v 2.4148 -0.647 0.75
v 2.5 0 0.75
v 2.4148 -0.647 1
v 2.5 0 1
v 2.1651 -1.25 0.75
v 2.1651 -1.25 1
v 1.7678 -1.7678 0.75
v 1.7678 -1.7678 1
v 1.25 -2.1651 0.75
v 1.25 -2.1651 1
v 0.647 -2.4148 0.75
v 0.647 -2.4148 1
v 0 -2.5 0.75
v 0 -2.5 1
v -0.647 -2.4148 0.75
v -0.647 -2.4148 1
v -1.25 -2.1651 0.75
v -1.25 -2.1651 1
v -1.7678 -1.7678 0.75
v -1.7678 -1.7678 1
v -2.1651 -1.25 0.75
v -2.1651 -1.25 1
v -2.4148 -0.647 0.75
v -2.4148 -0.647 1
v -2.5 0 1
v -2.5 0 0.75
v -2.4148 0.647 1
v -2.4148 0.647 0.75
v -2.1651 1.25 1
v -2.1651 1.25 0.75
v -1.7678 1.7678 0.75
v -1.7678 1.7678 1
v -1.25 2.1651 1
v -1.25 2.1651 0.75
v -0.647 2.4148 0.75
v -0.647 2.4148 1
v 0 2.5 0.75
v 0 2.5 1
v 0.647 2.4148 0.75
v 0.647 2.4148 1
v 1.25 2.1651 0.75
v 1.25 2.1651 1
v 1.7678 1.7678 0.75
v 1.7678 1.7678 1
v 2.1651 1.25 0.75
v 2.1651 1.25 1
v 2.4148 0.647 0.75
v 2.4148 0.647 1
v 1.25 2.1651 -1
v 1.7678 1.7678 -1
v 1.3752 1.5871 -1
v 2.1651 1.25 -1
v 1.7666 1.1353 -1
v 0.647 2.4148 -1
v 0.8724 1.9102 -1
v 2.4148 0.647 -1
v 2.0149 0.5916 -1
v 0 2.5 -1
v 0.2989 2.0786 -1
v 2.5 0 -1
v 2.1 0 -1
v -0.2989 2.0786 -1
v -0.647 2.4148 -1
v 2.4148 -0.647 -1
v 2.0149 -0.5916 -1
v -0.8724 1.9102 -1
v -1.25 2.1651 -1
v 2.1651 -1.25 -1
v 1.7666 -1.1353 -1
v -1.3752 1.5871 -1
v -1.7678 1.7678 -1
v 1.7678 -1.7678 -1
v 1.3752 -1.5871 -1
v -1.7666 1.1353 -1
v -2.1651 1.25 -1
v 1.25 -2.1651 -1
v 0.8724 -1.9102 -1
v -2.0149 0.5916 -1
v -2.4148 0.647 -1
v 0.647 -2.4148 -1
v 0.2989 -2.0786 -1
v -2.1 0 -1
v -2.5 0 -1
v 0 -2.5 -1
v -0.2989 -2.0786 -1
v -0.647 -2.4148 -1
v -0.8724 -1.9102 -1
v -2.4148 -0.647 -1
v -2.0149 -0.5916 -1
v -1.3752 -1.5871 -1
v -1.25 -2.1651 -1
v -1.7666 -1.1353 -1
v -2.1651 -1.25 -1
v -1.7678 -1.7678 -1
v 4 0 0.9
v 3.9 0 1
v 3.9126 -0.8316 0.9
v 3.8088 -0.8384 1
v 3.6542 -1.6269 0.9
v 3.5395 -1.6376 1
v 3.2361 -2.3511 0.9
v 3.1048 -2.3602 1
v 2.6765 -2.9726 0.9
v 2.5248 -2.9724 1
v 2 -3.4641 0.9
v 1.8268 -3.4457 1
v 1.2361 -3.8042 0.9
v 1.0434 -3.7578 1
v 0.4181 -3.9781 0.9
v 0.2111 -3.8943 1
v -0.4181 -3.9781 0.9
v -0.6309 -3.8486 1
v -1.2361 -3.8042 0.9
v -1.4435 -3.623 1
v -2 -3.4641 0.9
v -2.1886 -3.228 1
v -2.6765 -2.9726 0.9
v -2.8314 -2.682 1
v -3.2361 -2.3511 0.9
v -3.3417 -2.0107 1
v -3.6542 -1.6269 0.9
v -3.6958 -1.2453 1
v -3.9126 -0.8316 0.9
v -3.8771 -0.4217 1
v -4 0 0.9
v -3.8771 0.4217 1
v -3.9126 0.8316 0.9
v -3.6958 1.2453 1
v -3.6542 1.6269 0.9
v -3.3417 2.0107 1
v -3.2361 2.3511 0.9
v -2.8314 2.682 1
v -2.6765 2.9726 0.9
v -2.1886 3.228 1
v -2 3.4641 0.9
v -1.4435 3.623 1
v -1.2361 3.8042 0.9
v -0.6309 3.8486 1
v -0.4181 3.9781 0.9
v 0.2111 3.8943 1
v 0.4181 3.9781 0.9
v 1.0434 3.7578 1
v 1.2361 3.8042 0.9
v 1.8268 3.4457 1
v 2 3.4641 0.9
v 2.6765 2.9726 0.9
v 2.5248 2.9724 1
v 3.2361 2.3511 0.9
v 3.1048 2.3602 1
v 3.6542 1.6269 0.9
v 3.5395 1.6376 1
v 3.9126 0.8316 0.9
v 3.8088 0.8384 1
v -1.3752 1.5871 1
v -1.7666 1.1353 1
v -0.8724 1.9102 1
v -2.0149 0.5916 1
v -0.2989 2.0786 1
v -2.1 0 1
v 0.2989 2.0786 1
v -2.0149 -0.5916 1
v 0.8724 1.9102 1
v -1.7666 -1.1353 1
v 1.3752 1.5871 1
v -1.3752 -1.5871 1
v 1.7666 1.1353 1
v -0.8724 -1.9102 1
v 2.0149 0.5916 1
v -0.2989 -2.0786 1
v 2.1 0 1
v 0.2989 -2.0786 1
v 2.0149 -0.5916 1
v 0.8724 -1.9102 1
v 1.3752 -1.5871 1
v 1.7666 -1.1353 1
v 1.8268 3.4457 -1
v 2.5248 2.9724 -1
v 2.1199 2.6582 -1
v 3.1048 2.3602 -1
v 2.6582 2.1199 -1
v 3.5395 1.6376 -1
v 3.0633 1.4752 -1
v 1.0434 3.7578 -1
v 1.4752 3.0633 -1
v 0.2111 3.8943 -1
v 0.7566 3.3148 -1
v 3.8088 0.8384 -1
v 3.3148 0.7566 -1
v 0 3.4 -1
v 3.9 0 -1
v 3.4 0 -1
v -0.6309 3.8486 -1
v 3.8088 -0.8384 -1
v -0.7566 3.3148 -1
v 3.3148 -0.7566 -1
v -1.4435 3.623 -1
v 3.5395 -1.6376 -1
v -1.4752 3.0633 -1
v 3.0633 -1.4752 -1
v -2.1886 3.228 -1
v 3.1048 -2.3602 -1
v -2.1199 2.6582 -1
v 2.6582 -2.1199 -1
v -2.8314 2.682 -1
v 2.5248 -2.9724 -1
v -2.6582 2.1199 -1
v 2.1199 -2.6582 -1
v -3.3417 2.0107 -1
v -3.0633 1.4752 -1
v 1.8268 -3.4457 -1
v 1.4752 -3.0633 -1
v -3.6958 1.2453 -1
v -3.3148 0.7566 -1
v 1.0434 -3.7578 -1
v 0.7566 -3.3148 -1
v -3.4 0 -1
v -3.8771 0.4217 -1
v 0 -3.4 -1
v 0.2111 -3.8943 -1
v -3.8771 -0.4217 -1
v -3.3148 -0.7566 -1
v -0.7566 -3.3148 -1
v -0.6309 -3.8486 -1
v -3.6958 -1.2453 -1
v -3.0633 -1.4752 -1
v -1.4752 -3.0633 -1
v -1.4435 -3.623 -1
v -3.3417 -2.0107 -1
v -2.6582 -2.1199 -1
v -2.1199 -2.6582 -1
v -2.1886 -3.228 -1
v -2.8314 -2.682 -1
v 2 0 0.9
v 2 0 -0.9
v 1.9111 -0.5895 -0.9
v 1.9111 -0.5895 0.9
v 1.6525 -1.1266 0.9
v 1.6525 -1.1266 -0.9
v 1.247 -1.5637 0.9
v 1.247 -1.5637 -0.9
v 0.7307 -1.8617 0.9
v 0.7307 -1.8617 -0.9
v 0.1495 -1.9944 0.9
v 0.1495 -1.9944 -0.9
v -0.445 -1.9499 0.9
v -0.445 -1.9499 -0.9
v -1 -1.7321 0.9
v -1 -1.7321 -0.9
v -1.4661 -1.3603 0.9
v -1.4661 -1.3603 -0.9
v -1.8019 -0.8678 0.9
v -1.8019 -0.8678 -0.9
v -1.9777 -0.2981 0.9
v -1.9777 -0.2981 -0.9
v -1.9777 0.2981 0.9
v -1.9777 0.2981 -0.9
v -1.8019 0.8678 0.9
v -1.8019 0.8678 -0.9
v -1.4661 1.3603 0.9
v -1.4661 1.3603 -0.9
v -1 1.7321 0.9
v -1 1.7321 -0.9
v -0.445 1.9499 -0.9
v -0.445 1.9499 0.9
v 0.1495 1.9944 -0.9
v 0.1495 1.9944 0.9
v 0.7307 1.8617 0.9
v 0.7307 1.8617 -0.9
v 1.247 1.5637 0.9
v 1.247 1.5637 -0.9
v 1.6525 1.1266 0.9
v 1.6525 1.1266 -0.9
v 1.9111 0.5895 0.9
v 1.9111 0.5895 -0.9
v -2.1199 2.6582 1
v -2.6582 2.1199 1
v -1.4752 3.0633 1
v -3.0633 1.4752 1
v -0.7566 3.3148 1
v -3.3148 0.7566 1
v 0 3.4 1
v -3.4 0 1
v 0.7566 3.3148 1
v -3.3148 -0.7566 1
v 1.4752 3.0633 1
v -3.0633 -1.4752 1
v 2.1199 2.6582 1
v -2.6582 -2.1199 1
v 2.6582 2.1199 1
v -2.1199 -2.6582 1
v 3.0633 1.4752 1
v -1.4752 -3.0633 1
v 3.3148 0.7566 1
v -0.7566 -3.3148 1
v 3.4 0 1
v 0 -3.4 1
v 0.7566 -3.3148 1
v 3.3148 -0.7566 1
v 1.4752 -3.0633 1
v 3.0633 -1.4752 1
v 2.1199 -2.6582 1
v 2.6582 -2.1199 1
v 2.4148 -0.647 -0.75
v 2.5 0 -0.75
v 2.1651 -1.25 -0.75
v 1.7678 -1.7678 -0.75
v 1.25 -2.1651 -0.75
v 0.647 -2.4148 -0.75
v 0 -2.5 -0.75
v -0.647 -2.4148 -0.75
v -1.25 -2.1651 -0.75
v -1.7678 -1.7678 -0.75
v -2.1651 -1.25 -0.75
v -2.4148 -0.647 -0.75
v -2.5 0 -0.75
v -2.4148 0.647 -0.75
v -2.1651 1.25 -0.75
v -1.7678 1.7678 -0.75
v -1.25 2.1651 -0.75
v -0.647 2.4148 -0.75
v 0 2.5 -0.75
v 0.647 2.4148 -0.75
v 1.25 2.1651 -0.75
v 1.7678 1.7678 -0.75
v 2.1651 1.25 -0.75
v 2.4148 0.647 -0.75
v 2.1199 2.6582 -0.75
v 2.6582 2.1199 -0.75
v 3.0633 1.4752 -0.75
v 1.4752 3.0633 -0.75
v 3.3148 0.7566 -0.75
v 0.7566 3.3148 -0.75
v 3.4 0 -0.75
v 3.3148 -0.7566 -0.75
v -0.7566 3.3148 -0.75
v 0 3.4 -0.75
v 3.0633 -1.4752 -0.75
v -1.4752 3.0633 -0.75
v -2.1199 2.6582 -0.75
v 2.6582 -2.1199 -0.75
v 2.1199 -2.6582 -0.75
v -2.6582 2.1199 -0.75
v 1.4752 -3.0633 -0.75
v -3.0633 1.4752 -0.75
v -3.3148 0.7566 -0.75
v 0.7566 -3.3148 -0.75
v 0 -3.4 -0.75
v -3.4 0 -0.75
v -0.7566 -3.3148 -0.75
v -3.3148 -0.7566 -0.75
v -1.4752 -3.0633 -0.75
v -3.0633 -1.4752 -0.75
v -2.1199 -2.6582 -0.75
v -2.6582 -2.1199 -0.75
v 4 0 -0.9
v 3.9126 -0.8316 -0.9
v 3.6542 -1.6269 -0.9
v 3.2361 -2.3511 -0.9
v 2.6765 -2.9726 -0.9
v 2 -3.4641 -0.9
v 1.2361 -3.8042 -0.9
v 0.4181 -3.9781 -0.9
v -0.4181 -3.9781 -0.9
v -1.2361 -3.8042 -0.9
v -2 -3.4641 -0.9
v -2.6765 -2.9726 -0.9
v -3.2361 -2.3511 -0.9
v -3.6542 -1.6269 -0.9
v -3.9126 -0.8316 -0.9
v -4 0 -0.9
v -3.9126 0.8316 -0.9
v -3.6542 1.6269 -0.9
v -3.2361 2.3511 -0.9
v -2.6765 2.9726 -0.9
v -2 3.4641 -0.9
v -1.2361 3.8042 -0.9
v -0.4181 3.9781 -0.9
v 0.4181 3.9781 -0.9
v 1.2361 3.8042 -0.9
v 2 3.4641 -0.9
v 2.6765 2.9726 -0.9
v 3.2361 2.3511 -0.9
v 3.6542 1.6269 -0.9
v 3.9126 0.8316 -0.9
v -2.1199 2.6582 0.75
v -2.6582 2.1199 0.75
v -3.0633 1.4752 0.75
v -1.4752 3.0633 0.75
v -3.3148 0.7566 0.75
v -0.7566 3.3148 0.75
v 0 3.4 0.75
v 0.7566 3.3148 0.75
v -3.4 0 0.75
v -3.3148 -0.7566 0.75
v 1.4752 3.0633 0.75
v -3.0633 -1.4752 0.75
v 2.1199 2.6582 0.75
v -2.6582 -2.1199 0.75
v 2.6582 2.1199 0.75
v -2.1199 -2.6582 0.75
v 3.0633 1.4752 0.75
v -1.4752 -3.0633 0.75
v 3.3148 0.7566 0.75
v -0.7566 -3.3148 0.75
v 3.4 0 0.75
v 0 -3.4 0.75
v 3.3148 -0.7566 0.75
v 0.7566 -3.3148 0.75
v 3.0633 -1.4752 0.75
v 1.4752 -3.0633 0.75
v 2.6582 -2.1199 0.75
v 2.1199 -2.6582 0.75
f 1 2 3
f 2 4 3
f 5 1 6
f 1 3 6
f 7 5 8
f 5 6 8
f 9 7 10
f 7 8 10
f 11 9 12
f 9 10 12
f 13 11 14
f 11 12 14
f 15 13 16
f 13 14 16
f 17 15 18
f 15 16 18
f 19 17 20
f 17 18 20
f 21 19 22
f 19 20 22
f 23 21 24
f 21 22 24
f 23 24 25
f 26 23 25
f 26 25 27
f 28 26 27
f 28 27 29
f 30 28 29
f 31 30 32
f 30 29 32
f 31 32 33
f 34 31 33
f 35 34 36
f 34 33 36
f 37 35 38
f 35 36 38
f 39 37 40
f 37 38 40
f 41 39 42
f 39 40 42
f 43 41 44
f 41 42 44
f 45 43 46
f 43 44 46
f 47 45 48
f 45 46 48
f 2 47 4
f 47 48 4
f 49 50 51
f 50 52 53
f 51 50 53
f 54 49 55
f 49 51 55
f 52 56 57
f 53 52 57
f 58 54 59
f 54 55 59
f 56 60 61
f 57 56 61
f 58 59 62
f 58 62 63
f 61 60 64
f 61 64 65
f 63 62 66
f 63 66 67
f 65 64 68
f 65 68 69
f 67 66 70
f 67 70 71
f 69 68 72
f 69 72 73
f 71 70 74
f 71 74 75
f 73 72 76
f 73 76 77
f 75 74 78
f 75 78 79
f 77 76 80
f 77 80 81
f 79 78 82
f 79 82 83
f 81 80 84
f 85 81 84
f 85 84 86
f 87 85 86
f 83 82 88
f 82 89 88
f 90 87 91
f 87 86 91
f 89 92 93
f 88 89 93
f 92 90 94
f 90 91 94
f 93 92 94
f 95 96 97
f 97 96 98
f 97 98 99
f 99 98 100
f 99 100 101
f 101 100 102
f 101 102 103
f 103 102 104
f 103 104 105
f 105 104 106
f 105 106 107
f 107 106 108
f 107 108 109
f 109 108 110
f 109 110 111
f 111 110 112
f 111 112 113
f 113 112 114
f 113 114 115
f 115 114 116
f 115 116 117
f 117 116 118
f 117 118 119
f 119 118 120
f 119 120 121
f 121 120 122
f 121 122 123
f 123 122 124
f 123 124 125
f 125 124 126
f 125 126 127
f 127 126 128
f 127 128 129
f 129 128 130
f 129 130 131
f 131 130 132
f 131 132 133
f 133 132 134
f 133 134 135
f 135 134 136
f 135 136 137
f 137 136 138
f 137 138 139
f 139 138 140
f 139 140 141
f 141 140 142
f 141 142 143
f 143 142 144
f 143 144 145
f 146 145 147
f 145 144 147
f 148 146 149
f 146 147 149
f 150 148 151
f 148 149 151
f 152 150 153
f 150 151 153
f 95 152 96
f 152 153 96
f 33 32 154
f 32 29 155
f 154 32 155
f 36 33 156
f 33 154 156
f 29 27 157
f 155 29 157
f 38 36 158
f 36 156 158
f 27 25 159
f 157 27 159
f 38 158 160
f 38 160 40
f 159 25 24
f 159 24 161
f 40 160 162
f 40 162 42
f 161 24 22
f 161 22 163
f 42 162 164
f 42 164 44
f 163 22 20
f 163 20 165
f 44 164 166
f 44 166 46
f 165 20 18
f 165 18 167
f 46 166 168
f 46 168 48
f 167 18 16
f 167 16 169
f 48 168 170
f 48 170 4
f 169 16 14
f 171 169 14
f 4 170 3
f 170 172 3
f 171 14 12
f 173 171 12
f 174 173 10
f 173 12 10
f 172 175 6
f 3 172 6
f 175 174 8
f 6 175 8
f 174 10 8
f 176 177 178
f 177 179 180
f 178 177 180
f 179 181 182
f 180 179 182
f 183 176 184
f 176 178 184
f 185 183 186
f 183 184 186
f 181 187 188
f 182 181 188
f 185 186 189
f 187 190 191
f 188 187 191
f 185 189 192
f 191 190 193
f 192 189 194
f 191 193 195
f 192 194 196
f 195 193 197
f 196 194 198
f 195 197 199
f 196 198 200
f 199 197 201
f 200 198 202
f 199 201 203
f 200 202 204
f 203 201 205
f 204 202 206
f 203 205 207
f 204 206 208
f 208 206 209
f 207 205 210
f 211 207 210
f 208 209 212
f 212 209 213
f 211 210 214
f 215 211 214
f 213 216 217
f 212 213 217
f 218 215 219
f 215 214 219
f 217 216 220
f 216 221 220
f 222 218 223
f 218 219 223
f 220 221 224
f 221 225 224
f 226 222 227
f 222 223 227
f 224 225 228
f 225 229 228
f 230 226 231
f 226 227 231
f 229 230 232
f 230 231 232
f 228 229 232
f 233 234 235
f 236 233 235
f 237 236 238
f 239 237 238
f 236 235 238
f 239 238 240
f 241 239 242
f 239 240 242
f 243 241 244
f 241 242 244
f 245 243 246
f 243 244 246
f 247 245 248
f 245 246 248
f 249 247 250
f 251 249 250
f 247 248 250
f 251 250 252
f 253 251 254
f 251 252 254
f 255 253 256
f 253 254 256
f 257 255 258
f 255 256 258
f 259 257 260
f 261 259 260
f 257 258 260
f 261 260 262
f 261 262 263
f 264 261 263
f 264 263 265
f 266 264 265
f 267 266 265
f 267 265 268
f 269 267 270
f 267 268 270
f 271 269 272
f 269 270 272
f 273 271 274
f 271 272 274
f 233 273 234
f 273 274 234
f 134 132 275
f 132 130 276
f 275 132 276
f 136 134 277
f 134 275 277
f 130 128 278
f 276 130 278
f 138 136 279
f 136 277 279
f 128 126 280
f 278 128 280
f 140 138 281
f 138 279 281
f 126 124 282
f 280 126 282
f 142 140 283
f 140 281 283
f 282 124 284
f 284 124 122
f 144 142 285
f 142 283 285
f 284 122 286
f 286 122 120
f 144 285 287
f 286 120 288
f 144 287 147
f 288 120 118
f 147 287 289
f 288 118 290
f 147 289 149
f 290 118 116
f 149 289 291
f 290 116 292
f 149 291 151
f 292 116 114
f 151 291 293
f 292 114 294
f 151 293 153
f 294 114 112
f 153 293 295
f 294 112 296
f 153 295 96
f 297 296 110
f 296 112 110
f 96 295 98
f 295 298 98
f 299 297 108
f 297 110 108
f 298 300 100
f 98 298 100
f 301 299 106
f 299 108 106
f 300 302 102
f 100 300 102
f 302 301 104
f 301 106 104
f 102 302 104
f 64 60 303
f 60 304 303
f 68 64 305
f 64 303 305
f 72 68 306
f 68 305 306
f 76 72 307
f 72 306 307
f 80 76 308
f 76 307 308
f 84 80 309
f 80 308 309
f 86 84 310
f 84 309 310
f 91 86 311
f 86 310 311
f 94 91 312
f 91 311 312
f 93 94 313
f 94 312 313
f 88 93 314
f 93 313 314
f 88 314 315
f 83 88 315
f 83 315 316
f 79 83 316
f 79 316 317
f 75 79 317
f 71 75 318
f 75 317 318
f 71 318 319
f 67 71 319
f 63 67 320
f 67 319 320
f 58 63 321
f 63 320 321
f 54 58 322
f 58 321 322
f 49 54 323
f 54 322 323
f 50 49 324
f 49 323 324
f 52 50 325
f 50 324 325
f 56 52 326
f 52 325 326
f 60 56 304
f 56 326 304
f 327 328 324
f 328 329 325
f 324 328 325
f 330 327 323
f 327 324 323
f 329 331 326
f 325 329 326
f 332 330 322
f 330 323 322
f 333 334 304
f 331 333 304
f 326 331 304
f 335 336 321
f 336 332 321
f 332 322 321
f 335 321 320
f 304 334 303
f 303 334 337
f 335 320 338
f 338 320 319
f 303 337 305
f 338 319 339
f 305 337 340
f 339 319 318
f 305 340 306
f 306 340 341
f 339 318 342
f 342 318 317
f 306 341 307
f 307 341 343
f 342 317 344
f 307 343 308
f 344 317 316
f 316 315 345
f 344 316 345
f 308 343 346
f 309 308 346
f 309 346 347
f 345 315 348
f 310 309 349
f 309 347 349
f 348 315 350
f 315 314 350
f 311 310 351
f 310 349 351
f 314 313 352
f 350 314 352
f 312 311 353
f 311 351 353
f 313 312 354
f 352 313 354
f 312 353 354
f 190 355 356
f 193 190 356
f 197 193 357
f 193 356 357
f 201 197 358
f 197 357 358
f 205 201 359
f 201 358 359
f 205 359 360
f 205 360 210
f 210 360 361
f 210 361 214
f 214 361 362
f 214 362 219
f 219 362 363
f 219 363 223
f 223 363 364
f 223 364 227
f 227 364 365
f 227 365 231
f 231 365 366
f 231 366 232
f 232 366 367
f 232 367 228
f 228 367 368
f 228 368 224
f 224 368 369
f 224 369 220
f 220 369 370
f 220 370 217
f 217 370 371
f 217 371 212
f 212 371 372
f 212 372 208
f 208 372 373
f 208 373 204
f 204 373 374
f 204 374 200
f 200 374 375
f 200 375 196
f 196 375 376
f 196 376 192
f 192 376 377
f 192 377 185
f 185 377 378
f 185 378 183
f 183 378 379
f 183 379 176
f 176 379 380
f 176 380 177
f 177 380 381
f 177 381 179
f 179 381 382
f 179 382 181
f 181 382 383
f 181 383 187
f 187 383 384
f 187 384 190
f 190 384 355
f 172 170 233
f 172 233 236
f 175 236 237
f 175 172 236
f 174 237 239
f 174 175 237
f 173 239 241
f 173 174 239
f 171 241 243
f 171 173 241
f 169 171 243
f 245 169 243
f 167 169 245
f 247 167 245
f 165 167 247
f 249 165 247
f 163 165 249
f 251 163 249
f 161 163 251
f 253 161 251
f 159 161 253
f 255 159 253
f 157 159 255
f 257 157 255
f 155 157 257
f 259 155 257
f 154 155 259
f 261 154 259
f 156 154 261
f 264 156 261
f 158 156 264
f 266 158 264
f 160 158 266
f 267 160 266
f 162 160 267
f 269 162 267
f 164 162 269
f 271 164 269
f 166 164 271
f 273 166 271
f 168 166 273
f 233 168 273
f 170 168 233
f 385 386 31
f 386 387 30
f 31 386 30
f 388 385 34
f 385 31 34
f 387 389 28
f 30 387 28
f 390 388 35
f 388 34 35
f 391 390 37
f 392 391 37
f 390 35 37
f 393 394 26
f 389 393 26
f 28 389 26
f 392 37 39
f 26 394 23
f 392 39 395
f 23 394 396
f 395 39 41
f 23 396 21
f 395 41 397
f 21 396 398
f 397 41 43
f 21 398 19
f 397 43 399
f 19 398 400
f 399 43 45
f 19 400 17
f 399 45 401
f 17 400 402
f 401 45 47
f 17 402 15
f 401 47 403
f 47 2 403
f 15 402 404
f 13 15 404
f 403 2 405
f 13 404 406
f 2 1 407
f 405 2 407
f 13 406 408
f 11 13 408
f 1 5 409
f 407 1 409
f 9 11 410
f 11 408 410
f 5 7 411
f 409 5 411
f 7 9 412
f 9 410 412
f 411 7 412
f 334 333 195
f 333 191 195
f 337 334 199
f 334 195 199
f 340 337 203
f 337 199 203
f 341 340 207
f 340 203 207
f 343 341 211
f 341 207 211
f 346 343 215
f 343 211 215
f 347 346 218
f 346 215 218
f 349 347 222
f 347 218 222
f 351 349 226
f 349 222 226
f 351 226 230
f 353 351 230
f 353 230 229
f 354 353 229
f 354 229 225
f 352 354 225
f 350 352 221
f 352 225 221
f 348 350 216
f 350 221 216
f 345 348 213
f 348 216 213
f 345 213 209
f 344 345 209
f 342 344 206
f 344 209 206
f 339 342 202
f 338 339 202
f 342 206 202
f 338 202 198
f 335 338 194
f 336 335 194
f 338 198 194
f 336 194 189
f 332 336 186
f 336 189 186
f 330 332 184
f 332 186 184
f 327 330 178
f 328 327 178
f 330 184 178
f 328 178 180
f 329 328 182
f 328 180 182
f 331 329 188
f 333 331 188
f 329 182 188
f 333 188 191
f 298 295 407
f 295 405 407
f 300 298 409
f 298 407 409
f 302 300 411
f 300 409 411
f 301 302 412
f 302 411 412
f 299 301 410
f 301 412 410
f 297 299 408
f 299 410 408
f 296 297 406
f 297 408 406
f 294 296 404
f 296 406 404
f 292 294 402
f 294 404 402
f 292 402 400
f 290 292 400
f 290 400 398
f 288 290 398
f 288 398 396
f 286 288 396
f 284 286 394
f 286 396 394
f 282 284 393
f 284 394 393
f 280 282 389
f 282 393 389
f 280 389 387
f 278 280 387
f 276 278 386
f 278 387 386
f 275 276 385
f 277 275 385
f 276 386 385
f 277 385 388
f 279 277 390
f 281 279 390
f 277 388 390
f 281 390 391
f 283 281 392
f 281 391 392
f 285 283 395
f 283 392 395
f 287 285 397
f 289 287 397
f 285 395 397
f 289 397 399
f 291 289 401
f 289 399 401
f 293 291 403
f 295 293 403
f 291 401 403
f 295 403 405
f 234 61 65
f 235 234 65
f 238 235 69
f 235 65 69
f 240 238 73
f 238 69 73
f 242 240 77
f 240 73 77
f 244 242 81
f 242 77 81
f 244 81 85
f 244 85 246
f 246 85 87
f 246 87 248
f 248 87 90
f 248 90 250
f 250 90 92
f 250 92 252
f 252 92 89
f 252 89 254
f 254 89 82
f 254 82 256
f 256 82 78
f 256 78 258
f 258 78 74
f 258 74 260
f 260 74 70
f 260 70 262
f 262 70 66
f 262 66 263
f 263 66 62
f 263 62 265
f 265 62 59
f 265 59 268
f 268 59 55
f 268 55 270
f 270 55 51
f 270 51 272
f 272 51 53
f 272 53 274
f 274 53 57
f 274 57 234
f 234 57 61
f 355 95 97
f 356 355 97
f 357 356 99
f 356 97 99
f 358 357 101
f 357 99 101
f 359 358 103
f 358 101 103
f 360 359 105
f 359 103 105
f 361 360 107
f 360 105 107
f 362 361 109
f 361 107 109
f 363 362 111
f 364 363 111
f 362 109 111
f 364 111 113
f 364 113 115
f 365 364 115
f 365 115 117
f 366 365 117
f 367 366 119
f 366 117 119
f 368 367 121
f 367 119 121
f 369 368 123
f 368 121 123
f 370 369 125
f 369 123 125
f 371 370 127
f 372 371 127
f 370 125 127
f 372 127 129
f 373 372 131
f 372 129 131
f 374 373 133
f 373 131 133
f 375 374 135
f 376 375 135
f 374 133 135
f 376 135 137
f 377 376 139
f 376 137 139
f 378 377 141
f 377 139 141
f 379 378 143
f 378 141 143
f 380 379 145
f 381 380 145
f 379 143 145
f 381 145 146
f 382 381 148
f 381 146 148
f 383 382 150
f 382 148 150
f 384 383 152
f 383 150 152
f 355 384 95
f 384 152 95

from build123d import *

# Parameters (mm, degrees)
FASE1_SIZE = 0.1


with BuildPart() as part:
    # Skizze2 → Rotation1 (revolve)
    with BuildSketch(Plane(origin=(0, 0, 0), x_dir=(0, 0, -1), z_dir=(1, 0, 0))):
        Polygon((-1, 2), (1, 2), (1, 2.5), (0.75, 2.5), (0.75, 3.4), (1, 3.4), (1, 4), (-1, 4), (-1, 3.4), (-0.75, 3.4), (-0.75, 2.5), (-1, 2.5), align=None)
    revolve(axis=Axis((0, 0, 11.845846522), (0, 0, -1)))

    # Fase1
    fase1_edges = [part.edges().sort_by_distance(p)[0] for p in [
        (0, -2, -1),
        (0, -2, 1),
        (0, -4, -1),
        (0, -4, 1),
    ]]
    chamfer(fase1_edges, length=FASE1_SIZE)


solid = part.part
